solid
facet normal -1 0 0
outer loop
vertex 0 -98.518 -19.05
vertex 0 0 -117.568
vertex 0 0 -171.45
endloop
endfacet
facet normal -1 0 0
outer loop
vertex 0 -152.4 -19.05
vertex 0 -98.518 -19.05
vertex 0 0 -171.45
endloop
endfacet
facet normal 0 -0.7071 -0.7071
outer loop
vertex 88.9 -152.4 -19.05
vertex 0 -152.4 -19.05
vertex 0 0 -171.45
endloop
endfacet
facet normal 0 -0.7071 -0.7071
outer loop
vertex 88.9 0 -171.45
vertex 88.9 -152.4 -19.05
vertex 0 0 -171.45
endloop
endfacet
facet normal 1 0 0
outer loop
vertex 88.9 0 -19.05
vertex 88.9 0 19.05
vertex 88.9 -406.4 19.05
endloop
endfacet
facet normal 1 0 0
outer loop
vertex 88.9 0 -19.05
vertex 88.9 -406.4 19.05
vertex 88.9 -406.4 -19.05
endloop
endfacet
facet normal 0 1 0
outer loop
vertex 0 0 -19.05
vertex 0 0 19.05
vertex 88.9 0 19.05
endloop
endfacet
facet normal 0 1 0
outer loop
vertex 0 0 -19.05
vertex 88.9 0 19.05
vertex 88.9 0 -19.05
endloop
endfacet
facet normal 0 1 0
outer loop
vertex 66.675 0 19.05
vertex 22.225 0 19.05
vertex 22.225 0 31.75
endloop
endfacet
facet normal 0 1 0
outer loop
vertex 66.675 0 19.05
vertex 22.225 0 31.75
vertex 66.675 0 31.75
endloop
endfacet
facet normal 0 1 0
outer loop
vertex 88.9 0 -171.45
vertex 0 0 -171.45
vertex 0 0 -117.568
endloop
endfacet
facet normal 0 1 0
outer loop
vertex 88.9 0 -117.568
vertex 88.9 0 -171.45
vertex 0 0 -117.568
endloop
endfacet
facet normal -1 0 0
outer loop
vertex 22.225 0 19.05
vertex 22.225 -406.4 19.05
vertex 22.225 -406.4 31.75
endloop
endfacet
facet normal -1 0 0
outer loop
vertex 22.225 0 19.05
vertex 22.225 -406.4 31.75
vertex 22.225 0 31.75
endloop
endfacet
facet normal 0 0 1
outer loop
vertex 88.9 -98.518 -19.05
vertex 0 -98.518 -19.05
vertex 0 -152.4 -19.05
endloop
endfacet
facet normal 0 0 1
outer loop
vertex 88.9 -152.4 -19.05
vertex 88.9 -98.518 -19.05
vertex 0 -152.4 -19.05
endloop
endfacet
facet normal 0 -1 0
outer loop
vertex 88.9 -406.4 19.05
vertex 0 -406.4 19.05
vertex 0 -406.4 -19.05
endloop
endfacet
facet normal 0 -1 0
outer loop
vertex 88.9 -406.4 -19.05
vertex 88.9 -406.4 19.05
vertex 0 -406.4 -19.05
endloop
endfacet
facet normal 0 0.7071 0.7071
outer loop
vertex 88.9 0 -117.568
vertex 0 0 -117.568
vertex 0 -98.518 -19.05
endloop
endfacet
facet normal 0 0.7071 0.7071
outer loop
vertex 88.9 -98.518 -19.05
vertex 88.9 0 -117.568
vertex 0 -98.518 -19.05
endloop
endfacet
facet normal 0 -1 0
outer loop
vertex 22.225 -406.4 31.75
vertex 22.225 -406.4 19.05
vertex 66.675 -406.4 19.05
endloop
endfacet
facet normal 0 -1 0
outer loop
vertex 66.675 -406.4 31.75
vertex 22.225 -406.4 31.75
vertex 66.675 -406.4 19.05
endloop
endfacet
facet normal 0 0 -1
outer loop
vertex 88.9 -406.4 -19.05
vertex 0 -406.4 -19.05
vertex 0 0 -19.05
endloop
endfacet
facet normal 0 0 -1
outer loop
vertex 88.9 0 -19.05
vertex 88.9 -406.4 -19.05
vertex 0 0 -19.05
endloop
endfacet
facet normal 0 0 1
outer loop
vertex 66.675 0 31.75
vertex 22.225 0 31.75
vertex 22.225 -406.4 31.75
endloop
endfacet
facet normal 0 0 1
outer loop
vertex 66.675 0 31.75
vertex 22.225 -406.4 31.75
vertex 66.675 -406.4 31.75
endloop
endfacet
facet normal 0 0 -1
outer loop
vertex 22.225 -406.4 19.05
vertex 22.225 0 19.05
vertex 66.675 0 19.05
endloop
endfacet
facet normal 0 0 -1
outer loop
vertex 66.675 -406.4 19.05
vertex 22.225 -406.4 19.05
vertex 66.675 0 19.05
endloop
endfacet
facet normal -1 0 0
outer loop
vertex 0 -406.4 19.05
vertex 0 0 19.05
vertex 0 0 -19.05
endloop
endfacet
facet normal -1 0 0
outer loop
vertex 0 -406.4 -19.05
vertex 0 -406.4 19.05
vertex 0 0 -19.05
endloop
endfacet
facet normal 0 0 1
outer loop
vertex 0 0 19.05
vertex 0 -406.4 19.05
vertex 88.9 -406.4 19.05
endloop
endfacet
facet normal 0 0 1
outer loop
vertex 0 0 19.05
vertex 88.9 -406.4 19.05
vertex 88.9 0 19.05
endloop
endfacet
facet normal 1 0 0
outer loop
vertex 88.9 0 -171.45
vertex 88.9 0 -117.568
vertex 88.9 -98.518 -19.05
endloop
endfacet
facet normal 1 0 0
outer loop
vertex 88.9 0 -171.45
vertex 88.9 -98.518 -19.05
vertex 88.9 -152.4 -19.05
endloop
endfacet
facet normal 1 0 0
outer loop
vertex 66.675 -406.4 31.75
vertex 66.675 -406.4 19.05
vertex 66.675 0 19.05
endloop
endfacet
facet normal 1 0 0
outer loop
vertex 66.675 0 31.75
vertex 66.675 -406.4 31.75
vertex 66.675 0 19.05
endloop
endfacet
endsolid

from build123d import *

# Parameters (mm, degrees)
SKETCH2_W              = 38.1
SKETCH2_H              = 406.4
SLIDER_BOARD_DEPTH     = 88.9
DIAGONAL_SUPPORT_DEPTH = 88.9
SKETCH4_W              = 44.45
SKETCH4_H              = 406.4
SLIDER_DEPTH           = 12.7


with BuildPart() as part:
    # Sketch2 → Slider_Board (new body)
    with BuildSketch(Plane(origin=(0, 0, 0), x_dir=(0, 0, -1), z_dir=(1, 0, 0))):
        with Locations((0, -203.2)):
            Rectangle(SKETCH2_W, SKETCH2_H)
    extrude(amount=SLIDER_BOARD_DEPTH)


with BuildPart() as body_2:
    # Sketch3 → Diagonal_Support (new body)
    with BuildSketch(Plane(origin=(0, 0, 0), x_dir=(0, 0, -1), z_dir=(1, 0, 0))):
        Polygon((19.05, -152.4), (171.45, 0), (117.568463274, 0), (19.05, -98.518463274), align=None)
    extrude(amount=DIAGONAL_SUPPORT_DEPTH)


with BuildPart() as body_3:
    # Sketch4 → Slider (new body)
    with BuildSketch(Plane.XY.offset(19.05)):
        with Locations((44.45, -203.2)):
            Rectangle(SKETCH4_W, SKETCH4_H)
    extrude(amount=SLIDER_DEPTH)


solid = Compound([part.part, body_2.part, body_3.part])
